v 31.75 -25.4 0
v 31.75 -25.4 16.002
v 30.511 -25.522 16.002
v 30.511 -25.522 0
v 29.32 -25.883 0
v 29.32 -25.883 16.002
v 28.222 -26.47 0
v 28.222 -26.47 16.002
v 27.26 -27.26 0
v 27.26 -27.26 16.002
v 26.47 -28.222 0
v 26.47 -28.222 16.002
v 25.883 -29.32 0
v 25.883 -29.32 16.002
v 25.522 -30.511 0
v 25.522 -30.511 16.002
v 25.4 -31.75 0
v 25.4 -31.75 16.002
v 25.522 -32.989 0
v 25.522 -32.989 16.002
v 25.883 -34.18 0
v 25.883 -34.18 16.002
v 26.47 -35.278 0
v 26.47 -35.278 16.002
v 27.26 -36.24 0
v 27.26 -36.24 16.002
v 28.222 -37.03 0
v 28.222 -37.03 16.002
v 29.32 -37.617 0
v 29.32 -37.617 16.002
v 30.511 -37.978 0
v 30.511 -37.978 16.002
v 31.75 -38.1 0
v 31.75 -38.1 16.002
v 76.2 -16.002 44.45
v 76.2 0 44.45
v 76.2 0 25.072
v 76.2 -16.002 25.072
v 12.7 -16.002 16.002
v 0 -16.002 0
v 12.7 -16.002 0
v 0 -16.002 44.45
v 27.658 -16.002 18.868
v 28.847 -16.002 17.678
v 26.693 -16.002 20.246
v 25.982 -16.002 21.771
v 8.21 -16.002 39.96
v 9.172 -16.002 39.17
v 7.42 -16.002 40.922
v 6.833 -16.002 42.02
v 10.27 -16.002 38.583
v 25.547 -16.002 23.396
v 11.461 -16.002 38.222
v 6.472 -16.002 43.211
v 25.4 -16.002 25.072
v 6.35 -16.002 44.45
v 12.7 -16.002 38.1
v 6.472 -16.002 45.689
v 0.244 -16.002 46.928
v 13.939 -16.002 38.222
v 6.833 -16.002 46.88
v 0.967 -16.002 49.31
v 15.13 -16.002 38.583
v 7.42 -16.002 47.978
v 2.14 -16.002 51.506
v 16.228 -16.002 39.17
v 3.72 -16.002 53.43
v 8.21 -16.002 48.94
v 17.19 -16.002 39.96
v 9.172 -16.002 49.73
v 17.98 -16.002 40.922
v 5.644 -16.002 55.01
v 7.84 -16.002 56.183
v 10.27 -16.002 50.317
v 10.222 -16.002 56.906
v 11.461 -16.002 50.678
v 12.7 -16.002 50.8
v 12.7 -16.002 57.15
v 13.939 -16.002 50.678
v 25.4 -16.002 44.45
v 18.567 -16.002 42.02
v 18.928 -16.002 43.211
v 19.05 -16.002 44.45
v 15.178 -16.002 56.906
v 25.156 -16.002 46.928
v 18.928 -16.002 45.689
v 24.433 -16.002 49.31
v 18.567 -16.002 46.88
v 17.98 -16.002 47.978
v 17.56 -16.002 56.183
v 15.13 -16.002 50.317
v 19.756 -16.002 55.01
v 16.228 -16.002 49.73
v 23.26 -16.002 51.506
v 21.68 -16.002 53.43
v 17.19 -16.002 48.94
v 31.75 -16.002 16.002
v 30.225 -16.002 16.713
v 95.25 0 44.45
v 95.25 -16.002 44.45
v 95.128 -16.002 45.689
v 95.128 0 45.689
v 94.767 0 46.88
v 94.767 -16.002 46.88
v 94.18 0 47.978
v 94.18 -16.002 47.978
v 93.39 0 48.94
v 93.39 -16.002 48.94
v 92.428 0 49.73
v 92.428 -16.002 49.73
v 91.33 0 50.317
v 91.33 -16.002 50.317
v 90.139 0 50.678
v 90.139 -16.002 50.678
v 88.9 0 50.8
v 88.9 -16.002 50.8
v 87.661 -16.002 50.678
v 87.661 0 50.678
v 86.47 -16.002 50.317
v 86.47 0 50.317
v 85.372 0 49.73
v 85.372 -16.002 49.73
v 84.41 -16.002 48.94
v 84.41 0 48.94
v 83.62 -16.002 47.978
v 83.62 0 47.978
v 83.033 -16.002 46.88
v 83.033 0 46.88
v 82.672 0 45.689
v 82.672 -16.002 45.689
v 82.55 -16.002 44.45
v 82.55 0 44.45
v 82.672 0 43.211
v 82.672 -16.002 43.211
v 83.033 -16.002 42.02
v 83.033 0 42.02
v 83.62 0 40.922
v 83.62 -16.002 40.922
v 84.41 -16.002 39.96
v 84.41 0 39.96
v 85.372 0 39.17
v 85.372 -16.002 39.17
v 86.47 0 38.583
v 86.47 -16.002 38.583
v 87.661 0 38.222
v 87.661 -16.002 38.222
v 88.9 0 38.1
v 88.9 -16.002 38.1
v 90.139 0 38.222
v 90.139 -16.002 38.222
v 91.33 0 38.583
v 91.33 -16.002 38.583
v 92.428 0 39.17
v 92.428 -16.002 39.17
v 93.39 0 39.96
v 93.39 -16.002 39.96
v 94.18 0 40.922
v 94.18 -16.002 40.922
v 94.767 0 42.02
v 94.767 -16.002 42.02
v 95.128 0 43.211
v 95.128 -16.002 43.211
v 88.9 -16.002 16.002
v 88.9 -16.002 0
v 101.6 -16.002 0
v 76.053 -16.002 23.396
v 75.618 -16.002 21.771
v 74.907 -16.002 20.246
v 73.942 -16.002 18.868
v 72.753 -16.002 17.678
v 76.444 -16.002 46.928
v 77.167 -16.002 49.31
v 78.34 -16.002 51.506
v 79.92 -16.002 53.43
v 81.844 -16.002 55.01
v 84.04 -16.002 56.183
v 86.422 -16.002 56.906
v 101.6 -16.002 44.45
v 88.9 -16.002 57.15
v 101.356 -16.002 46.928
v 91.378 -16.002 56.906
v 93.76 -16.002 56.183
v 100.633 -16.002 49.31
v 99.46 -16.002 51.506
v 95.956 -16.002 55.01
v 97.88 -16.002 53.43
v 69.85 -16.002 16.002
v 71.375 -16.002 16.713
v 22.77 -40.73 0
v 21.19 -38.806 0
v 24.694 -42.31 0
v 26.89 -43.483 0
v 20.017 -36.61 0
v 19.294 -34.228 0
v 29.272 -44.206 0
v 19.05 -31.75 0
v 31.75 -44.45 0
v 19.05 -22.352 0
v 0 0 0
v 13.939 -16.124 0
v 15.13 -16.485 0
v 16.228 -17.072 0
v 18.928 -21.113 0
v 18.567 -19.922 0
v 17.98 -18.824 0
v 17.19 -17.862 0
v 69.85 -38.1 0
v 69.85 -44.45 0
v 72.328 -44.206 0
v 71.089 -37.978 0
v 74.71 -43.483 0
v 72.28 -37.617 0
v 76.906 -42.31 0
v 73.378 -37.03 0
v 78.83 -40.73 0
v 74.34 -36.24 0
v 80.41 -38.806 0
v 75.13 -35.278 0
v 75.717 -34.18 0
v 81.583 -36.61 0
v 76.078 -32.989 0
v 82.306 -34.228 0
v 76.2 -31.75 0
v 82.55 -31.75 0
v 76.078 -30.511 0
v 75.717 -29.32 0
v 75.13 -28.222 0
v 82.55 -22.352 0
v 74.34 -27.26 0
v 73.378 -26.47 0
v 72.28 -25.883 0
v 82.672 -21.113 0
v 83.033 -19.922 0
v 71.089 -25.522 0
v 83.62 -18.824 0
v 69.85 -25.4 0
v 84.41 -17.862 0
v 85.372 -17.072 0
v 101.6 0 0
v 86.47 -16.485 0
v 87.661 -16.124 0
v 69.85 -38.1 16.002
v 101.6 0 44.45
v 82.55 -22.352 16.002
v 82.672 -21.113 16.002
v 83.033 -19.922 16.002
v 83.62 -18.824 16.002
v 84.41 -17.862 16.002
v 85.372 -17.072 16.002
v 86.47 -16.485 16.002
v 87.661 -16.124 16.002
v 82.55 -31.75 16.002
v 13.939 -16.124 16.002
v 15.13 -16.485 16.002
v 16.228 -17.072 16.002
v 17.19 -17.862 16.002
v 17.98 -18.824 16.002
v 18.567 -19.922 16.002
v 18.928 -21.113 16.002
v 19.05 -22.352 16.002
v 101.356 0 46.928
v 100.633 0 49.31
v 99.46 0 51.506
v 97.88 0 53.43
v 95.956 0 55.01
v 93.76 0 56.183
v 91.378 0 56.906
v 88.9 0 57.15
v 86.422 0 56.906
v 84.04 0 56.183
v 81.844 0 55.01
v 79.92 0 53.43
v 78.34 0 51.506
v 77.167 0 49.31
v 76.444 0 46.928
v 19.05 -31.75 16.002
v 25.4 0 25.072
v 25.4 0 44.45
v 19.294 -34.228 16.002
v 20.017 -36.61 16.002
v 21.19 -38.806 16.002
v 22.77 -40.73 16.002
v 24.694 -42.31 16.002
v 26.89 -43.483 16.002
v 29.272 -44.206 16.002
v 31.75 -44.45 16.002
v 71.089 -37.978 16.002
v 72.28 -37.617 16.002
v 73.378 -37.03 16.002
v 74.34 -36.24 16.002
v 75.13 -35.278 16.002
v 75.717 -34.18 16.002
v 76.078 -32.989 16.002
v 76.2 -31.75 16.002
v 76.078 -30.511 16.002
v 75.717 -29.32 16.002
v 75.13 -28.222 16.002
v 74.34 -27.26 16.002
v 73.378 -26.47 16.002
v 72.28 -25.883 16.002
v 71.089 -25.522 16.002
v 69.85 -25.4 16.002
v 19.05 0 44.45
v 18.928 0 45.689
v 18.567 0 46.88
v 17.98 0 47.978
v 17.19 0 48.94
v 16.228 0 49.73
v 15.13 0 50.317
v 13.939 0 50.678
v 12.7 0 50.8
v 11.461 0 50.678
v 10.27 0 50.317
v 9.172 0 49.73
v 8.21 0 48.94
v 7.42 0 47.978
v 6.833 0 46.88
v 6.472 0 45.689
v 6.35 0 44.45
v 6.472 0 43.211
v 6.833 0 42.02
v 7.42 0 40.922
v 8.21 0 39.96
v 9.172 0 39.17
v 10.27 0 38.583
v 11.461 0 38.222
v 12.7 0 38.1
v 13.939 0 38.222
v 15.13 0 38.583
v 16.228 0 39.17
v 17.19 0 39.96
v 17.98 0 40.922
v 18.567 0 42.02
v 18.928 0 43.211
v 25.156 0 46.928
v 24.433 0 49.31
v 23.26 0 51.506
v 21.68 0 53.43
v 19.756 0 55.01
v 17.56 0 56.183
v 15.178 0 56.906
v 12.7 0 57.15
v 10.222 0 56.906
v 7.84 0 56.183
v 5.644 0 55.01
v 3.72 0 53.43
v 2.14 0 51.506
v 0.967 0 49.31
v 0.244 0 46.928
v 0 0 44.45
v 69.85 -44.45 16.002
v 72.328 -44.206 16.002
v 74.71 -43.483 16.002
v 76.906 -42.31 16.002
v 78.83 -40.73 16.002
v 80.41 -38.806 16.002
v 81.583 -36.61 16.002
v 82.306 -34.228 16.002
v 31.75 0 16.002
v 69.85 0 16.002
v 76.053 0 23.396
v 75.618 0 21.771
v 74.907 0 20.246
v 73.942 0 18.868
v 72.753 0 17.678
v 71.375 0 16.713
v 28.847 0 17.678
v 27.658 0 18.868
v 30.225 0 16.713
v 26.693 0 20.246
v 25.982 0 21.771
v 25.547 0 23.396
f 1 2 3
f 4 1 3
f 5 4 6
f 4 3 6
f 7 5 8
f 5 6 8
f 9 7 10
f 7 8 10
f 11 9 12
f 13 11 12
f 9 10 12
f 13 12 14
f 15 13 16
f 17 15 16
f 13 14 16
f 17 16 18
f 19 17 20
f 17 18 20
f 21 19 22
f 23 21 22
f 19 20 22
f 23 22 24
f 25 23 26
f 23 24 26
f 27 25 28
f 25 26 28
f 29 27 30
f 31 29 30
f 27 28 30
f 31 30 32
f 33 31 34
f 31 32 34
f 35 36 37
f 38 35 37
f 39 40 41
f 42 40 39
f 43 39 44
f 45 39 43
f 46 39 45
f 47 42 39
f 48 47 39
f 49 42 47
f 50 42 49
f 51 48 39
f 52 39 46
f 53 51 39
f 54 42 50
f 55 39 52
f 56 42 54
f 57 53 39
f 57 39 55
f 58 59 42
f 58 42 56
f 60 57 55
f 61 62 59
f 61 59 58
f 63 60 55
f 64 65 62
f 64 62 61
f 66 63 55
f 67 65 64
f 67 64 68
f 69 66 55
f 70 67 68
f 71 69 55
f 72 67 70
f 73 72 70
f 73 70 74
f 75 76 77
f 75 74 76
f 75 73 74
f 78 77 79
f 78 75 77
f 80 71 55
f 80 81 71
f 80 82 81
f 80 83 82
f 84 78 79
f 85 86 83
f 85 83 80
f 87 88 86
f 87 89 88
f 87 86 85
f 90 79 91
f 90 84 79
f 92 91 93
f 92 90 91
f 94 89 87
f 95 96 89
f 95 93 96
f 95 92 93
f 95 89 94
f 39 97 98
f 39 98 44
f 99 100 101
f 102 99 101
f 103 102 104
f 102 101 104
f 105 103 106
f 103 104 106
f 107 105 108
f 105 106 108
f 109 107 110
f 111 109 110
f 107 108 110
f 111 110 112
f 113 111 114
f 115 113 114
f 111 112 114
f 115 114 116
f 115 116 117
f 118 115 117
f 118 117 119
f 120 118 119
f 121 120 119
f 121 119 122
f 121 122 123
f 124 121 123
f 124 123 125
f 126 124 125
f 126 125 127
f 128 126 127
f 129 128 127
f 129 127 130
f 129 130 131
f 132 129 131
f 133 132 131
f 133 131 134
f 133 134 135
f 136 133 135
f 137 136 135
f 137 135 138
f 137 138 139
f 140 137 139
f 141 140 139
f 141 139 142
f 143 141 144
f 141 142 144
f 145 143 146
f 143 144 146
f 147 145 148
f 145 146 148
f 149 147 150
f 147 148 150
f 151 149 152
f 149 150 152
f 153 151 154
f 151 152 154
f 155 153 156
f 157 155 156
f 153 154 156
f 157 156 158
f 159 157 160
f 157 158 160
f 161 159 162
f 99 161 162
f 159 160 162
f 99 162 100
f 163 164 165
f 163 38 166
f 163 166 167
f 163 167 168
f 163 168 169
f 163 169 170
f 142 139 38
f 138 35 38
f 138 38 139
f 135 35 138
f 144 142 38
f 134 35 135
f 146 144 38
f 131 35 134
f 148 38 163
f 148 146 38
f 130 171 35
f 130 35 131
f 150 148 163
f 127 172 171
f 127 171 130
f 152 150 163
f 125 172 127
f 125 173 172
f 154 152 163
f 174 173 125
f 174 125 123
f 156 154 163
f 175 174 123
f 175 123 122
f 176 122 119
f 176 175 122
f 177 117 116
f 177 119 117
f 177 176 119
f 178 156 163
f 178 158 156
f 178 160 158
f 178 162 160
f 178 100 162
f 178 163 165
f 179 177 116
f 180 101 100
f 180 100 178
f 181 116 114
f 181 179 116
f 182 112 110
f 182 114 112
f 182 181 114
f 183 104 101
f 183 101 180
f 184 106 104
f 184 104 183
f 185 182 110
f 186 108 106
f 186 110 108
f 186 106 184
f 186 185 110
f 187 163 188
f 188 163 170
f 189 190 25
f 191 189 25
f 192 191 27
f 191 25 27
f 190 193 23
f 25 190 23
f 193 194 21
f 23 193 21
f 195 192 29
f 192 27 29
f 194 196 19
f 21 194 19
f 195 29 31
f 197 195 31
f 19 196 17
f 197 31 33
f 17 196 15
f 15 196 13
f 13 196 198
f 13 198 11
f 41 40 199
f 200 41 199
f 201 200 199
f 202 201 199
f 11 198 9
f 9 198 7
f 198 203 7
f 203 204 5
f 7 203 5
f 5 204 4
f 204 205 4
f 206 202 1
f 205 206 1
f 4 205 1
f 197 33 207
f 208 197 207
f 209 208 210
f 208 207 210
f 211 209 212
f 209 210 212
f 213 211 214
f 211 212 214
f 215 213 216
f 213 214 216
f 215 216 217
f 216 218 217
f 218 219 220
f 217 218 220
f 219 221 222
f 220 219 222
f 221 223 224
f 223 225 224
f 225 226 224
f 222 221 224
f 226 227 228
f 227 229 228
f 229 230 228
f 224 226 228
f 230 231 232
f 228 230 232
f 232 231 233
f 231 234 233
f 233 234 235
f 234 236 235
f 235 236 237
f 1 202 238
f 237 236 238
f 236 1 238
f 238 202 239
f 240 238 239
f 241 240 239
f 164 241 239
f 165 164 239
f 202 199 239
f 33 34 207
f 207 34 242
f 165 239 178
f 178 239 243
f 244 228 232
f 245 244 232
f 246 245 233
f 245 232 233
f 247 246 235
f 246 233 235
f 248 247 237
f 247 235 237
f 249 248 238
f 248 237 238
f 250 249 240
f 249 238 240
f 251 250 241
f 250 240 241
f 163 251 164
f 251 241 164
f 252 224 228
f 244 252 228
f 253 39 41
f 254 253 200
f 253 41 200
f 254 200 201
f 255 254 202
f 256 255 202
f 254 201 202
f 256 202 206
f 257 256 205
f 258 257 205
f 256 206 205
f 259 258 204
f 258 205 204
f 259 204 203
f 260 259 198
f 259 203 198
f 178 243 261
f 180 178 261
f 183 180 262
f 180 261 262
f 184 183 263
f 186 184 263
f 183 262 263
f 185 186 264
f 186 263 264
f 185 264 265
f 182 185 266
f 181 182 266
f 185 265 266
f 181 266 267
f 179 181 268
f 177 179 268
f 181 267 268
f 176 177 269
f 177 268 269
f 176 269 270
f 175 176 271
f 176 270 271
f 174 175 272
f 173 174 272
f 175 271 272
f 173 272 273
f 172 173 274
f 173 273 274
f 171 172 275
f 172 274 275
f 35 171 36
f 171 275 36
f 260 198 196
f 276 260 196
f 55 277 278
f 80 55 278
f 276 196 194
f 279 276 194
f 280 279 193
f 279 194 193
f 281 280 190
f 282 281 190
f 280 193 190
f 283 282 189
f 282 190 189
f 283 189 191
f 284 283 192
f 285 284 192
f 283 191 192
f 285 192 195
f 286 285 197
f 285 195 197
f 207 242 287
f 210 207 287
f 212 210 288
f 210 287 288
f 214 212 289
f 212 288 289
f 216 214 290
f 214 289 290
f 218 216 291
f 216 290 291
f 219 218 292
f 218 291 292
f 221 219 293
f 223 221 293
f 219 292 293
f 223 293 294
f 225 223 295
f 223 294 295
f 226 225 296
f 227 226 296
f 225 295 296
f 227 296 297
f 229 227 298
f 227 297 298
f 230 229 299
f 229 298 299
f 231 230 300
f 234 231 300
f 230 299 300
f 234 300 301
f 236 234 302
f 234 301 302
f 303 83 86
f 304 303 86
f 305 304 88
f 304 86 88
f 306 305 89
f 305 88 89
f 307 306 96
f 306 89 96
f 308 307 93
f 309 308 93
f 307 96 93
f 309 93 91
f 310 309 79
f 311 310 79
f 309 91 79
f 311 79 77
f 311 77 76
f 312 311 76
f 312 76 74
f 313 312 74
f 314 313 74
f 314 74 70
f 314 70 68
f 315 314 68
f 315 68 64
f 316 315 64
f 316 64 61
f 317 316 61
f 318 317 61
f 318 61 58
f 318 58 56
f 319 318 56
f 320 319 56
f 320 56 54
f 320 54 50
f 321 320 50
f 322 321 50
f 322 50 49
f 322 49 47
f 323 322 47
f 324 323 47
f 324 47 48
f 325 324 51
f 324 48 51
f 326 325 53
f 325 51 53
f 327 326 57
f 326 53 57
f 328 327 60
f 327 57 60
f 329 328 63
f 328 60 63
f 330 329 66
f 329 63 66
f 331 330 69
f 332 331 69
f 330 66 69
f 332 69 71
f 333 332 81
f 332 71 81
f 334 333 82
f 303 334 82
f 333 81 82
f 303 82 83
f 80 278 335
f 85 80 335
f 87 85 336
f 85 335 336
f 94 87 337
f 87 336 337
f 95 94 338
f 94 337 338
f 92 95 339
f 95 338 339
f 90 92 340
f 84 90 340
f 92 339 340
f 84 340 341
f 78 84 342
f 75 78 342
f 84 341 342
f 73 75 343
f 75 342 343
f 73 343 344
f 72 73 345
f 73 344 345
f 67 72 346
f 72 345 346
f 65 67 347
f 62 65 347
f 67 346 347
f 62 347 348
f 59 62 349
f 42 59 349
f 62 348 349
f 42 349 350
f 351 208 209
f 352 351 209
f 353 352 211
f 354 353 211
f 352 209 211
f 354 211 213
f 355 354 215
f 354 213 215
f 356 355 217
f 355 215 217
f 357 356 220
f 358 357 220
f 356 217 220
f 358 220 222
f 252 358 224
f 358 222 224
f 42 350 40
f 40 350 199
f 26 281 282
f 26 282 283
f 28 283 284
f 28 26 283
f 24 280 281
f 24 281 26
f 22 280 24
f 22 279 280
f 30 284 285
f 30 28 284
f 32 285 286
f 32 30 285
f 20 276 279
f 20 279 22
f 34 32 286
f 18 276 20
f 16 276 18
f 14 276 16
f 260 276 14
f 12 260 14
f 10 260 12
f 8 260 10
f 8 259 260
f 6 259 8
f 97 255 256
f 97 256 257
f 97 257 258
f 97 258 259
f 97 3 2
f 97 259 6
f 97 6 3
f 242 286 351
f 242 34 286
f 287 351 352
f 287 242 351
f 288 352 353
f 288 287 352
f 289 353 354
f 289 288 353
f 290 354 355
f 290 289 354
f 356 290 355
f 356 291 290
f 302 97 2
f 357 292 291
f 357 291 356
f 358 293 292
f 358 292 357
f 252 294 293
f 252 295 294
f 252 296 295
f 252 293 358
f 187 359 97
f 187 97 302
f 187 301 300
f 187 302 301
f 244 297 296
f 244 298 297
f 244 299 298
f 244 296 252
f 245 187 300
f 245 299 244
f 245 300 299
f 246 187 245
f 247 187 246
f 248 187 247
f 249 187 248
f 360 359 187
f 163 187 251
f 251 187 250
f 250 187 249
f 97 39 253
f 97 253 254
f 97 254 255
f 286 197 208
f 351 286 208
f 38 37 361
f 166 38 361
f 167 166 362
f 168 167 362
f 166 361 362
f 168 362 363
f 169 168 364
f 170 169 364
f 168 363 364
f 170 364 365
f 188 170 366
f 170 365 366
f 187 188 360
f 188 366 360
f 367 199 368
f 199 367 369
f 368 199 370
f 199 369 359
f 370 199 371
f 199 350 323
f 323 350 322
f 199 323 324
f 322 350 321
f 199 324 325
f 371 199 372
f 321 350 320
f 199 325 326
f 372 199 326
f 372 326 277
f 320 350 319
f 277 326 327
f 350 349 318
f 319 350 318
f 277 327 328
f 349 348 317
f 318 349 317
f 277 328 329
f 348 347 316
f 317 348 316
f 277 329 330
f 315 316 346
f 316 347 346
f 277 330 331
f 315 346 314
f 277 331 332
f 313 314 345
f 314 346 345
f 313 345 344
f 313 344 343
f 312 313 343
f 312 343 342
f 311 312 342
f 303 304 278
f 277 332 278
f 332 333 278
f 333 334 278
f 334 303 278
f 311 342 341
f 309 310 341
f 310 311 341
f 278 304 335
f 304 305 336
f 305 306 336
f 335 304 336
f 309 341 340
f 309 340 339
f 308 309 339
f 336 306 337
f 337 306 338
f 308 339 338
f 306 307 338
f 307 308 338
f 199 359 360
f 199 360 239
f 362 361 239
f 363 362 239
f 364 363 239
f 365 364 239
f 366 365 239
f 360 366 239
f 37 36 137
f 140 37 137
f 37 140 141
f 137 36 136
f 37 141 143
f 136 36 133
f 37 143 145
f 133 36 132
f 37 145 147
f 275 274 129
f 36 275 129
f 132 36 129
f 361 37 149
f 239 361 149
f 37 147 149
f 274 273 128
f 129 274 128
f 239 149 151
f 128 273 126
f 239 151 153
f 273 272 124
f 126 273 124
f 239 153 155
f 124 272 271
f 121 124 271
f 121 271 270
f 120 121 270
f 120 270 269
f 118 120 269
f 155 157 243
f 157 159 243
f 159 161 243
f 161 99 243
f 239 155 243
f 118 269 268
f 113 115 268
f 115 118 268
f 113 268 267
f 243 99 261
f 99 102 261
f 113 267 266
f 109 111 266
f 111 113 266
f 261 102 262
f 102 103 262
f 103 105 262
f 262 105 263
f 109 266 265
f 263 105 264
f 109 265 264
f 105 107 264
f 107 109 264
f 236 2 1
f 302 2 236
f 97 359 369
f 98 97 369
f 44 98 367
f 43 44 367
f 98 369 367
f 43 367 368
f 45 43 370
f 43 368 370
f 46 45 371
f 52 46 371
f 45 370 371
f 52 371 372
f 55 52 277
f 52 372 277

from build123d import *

# Parameters (mm, degrees)
F1_DEPTH = 16.002
F2_R     = 6.35
F3_DEPTH = 16.003
F6_DEPTH = 16.002
F4_W     = 38.1
F4_H     = 12.7
F7_DEPTH = 16.003


# Not quite as in the source:
# - a feature names something its author has since deleted; it is built from what else it names


with BuildPart() as f1:
    # F0 (on Front) → F1 (new body)
    with BuildSketch(Plane.XZ):
        with BuildLine():
            Line((0, 44.45), (0, 0))
            Line((0, 0), (101.6, 0))
            Line((101.6, 0), (101.6, 44.45))
            Line((101.6, 44.45), (76.2, 44.45))
            Line((76.2, 44.45), (76.2, 25.0716141042))
            ThreePointArc((76.2, 25.0716141042), (74.4547062675, 19.535812446), (69.85, 16.002))
            Line((69.85, 16.002), (31.75, 16.002))
            ThreePointArc((31.75, 16.002), (27.1452937325, 19.535812446), (25.4, 25.0716141042))
            Line((25.4, 25.0716141042), (25.4, 44.45))
            Line((25.4, 44.45), (0, 44.45))
        make_face()
        with BuildLine():
            ThreePointArc((25.4, 44.45), (12.7, 57.15), (0, 44.45))
            Line((0, 44.45), (25.4, 44.45))
        make_face()
        with BuildLine():
            Line((76.2, 44.45), (101.6, 44.45))
            ThreePointArc((101.6, 44.45), (88.9, 57.15), (76.2, 44.45))
        make_face()
    extrude(amount=F1_DEPTH)

    # F2 (on face) → F3 (cut, through all)
    with BuildSketch(Plane.XZ.offset(16.002)):
        with Locations((12.7, 44.45)):
            Circle(F2_R)
        with Locations((88.9, 44.45)):
            Circle(F2_R)
    extrude(amount=-F3_DEPTH, mode=Mode.SUBTRACT)

    # F5 (on Top) → F6 (join)
    with BuildSketch(Plane.XY):
        with BuildLine():
            ThreePointArc((19.05, -31.75), (22.7697438789, -40.7302561211), (31.75, -44.45))
            Line((31.75, -44.45), (69.85, -44.45))
            ThreePointArc((69.85, -44.45), (78.8302561211, -40.7302561211), (82.55, -31.75))
            Line((82.55, -31.75), (82.55, -22.352))
            Line((82.55, -22.352), (82.55, -16.002))
            Line((82.55, -16.002), (19.05, -16.002))
            Line((19.05, -16.002), (19.05, -22.352))
            Line((19.05, -22.352), (19.05, -31.75))
        make_face()
        with BuildLine():
            ThreePointArc((12.7, -16.002), (17.1901280605, -17.8618719395), (19.05, -22.352))
            Line((19.05, -22.352), (19.05, -16.002))
            Line((19.05, -16.002), (12.7, -16.002))
        make_face()
        with BuildLine():
            Line((82.55, -16.002), (82.55, -22.352))
            ThreePointArc((82.55, -22.352), (84.4098719395, -17.8618719395), (88.9, -16.002))
            Line((88.9, -16.002), (82.55, -16.002))
        make_face()
    extrude(amount=F6_DEPTH)

    # F4 (on face) → F7 (cut, through all)
    with BuildSketch(Plane.XY.offset(16.002)):
        with Locations((50.8, -31.75)):
            Rectangle(F4_W, F4_H)
        with BuildLine():
            Line((31.75, -38.1), (31.75, -25.4))
            ThreePointArc((31.75, -25.4), (25.4, -31.75), (31.75, -38.1))
        make_face()
        with BuildLine():
            ThreePointArc((69.85, -38.1), (76.2, -31.75), (69.85, -25.4))
            Line((69.85, -25.4), (69.85, -38.1))
        make_face()
    extrude(amount=-F7_DEPTH, mode=Mode.SUBTRACT)


solid = f1.part
